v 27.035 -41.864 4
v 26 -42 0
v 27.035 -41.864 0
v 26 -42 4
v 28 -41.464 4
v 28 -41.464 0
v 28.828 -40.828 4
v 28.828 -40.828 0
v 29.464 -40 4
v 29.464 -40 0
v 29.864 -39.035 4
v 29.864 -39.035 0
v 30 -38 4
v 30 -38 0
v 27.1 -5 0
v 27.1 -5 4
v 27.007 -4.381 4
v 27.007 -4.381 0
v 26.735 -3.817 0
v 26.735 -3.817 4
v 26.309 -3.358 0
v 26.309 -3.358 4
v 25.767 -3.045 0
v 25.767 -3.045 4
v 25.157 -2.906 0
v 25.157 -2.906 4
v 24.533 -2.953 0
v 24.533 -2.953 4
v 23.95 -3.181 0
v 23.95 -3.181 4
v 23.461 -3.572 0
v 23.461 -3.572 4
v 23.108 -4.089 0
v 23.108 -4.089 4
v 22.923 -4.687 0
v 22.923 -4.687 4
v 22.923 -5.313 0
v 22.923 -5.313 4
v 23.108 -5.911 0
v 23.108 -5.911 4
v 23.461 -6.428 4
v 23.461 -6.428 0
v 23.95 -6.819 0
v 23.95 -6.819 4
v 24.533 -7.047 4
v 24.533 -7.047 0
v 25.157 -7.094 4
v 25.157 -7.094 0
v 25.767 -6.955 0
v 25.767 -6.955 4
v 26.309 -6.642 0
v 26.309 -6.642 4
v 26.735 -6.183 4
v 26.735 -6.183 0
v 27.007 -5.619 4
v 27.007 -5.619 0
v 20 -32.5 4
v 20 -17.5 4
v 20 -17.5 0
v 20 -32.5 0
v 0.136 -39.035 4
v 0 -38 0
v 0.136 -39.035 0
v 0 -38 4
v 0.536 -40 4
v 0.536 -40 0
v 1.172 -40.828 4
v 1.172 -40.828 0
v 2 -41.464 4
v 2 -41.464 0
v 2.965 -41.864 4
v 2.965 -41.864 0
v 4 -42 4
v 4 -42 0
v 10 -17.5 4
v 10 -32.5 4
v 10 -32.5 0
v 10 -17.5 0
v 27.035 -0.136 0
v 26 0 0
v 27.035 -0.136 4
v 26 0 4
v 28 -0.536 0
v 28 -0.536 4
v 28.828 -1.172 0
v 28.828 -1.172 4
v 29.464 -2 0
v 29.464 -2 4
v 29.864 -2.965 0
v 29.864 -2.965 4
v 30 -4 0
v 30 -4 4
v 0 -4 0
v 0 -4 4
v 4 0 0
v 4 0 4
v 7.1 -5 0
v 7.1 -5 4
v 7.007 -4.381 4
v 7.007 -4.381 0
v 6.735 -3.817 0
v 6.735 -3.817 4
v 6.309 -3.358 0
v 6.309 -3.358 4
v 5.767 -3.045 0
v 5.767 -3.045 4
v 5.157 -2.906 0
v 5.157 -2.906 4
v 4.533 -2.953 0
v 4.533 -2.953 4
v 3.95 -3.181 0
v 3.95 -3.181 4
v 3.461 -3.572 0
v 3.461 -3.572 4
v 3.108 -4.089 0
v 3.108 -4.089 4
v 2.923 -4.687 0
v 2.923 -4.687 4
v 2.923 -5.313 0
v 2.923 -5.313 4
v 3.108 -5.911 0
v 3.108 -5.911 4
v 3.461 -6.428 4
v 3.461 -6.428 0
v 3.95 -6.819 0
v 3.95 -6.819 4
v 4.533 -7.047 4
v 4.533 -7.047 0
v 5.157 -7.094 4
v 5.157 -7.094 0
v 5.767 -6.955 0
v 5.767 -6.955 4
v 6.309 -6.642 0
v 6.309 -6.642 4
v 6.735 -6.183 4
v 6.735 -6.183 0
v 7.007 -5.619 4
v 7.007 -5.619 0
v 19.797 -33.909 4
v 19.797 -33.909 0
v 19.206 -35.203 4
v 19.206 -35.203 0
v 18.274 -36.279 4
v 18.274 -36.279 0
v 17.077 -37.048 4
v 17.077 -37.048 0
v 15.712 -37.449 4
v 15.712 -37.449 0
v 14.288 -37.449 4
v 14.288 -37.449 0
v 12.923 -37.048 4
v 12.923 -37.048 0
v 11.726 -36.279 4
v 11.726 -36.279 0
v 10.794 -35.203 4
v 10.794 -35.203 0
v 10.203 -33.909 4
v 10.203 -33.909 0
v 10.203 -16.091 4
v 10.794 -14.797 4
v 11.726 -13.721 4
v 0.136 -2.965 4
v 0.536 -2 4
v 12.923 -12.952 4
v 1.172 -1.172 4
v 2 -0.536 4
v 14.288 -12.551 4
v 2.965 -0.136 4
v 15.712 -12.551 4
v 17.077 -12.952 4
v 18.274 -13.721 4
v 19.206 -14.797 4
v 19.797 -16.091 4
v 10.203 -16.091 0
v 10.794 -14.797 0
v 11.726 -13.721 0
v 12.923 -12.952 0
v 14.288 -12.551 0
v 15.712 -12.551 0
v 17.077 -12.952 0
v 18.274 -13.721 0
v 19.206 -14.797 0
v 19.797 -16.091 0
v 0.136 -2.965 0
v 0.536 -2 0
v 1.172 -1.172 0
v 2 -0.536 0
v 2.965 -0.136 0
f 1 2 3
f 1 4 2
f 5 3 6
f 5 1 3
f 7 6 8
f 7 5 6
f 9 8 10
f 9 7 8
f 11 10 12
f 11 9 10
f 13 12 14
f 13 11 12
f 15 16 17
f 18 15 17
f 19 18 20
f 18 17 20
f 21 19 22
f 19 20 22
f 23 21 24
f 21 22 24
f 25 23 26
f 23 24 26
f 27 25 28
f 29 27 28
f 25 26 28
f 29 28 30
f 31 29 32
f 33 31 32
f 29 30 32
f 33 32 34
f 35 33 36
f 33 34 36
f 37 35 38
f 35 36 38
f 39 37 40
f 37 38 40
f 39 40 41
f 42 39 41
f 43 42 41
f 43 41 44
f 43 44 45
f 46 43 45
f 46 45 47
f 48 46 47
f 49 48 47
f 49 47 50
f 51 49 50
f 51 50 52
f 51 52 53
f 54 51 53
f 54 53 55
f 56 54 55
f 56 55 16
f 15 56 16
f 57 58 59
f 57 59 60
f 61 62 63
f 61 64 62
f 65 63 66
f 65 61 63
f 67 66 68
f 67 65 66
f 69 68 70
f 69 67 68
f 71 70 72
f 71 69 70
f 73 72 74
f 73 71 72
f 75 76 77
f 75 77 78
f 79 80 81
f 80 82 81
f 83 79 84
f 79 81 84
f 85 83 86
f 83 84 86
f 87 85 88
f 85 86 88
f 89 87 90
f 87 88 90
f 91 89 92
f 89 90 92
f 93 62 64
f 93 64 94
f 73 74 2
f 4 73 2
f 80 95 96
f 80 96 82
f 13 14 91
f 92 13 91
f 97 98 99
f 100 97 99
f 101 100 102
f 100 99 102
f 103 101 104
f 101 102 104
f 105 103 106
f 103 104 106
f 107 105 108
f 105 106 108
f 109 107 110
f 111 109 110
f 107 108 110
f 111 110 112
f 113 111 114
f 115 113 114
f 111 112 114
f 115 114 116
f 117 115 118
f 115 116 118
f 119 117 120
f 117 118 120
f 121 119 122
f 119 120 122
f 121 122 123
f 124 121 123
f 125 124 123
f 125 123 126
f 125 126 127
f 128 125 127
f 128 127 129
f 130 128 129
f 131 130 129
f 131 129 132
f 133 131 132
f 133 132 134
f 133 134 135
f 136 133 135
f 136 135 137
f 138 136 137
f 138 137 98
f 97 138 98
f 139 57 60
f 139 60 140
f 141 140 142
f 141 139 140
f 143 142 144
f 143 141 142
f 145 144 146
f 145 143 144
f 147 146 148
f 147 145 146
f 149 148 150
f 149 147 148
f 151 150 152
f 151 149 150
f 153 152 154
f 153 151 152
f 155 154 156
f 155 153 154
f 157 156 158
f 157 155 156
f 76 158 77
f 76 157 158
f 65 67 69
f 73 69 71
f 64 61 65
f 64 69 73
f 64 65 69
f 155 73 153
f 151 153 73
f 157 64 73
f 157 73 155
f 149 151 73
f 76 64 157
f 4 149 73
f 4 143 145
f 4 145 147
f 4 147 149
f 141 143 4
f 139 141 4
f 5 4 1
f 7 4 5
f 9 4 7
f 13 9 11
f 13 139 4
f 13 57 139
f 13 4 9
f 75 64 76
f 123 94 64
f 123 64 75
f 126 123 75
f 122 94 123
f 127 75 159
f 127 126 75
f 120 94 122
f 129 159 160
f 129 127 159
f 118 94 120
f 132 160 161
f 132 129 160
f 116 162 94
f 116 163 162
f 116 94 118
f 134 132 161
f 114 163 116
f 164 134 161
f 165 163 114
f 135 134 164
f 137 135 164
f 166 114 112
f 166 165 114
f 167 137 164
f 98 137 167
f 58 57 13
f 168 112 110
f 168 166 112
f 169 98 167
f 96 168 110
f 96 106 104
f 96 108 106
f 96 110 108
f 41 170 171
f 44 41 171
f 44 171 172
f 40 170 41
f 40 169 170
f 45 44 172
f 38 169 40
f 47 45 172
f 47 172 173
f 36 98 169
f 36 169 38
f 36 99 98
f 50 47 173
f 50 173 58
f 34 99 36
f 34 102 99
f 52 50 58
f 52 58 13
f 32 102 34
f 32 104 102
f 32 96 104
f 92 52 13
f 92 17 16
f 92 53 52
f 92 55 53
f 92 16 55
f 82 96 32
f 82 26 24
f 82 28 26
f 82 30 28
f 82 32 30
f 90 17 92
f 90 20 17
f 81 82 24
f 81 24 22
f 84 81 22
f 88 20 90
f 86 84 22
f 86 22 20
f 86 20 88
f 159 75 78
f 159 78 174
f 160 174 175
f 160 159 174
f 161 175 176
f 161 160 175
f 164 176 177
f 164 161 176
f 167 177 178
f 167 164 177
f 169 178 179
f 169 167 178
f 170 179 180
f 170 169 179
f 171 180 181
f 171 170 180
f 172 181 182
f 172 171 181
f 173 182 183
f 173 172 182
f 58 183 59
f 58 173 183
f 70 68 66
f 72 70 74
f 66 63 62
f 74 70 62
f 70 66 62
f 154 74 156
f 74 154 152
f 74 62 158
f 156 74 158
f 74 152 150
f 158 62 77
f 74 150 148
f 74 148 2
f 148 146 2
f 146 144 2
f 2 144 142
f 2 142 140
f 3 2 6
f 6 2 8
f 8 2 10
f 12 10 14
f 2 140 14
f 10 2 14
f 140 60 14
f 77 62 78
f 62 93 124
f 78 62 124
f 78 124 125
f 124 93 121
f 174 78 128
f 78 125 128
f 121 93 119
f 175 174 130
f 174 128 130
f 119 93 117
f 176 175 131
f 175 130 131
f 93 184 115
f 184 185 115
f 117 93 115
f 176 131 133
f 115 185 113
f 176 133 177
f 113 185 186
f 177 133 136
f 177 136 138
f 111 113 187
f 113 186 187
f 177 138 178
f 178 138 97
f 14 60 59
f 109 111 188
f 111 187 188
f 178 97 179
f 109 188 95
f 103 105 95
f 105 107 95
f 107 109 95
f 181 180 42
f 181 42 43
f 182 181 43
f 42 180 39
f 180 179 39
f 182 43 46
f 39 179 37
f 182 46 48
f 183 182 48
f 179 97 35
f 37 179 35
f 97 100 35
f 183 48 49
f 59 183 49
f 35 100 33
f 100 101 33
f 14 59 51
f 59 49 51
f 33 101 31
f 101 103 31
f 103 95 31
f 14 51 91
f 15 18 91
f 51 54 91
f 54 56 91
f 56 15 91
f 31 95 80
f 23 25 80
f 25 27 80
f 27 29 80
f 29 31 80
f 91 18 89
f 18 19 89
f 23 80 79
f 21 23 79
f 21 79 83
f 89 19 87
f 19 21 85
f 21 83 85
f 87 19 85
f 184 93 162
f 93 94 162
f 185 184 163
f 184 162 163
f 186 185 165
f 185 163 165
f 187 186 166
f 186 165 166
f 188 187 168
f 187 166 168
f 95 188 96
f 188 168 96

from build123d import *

# Parameters (mm, degrees)
SKETCH_1_W          = 30
SKETCH_1_H          = 42
EXTRUDE_1_DEPTH     = 4
SKETCH_2_R          = 2.1
CUT_EXTRUDE_1_DEPTH = 52.768716422
FILLET_1_R          = 4


with BuildPart() as part:
    # 草图1 → 凸台-拉伸1 (new body)
    with BuildSketch(Plane.XY):
        with Locations((15, -21)):
            Rectangle(SKETCH_1_W, SKETCH_1_H)
    extrude(amount=EXTRUDE_1_DEPTH)

    # 草图2 → 切除-拉伸1 (cut, through all)
    with BuildSketch(Plane.XY.offset(4)):
        with Locations((5, -5)):
            Circle(SKETCH_2_R)
        with Locations((25, -5)):
            Circle(SKETCH_2_R)
        with BuildLine():
            Line((20, -17.5), (20, -32.5))
            ThreePointArc((20, -32.5), (15, -37.5), (10, -32.5))
            Line((10, -32.5), (10, -17.5))
            ThreePointArc((10, -17.5), (15, -12.5), (20, -17.5))
        make_face()
    extrude(amount=-CUT_EXTRUDE_1_DEPTH, mode=Mode.SUBTRACT)

    # 圆角1
    fillet_1_edges = [part.edges().sort_by_distance(p)[0] for p in [
        (0, 0, 2),
        (30, 0, 2),
        (30, -42, 2),
        (0, -42, 2),
    ]]
    fillet(fillet_1_edges, radius=FILLET_1_R)


solid = part.part
